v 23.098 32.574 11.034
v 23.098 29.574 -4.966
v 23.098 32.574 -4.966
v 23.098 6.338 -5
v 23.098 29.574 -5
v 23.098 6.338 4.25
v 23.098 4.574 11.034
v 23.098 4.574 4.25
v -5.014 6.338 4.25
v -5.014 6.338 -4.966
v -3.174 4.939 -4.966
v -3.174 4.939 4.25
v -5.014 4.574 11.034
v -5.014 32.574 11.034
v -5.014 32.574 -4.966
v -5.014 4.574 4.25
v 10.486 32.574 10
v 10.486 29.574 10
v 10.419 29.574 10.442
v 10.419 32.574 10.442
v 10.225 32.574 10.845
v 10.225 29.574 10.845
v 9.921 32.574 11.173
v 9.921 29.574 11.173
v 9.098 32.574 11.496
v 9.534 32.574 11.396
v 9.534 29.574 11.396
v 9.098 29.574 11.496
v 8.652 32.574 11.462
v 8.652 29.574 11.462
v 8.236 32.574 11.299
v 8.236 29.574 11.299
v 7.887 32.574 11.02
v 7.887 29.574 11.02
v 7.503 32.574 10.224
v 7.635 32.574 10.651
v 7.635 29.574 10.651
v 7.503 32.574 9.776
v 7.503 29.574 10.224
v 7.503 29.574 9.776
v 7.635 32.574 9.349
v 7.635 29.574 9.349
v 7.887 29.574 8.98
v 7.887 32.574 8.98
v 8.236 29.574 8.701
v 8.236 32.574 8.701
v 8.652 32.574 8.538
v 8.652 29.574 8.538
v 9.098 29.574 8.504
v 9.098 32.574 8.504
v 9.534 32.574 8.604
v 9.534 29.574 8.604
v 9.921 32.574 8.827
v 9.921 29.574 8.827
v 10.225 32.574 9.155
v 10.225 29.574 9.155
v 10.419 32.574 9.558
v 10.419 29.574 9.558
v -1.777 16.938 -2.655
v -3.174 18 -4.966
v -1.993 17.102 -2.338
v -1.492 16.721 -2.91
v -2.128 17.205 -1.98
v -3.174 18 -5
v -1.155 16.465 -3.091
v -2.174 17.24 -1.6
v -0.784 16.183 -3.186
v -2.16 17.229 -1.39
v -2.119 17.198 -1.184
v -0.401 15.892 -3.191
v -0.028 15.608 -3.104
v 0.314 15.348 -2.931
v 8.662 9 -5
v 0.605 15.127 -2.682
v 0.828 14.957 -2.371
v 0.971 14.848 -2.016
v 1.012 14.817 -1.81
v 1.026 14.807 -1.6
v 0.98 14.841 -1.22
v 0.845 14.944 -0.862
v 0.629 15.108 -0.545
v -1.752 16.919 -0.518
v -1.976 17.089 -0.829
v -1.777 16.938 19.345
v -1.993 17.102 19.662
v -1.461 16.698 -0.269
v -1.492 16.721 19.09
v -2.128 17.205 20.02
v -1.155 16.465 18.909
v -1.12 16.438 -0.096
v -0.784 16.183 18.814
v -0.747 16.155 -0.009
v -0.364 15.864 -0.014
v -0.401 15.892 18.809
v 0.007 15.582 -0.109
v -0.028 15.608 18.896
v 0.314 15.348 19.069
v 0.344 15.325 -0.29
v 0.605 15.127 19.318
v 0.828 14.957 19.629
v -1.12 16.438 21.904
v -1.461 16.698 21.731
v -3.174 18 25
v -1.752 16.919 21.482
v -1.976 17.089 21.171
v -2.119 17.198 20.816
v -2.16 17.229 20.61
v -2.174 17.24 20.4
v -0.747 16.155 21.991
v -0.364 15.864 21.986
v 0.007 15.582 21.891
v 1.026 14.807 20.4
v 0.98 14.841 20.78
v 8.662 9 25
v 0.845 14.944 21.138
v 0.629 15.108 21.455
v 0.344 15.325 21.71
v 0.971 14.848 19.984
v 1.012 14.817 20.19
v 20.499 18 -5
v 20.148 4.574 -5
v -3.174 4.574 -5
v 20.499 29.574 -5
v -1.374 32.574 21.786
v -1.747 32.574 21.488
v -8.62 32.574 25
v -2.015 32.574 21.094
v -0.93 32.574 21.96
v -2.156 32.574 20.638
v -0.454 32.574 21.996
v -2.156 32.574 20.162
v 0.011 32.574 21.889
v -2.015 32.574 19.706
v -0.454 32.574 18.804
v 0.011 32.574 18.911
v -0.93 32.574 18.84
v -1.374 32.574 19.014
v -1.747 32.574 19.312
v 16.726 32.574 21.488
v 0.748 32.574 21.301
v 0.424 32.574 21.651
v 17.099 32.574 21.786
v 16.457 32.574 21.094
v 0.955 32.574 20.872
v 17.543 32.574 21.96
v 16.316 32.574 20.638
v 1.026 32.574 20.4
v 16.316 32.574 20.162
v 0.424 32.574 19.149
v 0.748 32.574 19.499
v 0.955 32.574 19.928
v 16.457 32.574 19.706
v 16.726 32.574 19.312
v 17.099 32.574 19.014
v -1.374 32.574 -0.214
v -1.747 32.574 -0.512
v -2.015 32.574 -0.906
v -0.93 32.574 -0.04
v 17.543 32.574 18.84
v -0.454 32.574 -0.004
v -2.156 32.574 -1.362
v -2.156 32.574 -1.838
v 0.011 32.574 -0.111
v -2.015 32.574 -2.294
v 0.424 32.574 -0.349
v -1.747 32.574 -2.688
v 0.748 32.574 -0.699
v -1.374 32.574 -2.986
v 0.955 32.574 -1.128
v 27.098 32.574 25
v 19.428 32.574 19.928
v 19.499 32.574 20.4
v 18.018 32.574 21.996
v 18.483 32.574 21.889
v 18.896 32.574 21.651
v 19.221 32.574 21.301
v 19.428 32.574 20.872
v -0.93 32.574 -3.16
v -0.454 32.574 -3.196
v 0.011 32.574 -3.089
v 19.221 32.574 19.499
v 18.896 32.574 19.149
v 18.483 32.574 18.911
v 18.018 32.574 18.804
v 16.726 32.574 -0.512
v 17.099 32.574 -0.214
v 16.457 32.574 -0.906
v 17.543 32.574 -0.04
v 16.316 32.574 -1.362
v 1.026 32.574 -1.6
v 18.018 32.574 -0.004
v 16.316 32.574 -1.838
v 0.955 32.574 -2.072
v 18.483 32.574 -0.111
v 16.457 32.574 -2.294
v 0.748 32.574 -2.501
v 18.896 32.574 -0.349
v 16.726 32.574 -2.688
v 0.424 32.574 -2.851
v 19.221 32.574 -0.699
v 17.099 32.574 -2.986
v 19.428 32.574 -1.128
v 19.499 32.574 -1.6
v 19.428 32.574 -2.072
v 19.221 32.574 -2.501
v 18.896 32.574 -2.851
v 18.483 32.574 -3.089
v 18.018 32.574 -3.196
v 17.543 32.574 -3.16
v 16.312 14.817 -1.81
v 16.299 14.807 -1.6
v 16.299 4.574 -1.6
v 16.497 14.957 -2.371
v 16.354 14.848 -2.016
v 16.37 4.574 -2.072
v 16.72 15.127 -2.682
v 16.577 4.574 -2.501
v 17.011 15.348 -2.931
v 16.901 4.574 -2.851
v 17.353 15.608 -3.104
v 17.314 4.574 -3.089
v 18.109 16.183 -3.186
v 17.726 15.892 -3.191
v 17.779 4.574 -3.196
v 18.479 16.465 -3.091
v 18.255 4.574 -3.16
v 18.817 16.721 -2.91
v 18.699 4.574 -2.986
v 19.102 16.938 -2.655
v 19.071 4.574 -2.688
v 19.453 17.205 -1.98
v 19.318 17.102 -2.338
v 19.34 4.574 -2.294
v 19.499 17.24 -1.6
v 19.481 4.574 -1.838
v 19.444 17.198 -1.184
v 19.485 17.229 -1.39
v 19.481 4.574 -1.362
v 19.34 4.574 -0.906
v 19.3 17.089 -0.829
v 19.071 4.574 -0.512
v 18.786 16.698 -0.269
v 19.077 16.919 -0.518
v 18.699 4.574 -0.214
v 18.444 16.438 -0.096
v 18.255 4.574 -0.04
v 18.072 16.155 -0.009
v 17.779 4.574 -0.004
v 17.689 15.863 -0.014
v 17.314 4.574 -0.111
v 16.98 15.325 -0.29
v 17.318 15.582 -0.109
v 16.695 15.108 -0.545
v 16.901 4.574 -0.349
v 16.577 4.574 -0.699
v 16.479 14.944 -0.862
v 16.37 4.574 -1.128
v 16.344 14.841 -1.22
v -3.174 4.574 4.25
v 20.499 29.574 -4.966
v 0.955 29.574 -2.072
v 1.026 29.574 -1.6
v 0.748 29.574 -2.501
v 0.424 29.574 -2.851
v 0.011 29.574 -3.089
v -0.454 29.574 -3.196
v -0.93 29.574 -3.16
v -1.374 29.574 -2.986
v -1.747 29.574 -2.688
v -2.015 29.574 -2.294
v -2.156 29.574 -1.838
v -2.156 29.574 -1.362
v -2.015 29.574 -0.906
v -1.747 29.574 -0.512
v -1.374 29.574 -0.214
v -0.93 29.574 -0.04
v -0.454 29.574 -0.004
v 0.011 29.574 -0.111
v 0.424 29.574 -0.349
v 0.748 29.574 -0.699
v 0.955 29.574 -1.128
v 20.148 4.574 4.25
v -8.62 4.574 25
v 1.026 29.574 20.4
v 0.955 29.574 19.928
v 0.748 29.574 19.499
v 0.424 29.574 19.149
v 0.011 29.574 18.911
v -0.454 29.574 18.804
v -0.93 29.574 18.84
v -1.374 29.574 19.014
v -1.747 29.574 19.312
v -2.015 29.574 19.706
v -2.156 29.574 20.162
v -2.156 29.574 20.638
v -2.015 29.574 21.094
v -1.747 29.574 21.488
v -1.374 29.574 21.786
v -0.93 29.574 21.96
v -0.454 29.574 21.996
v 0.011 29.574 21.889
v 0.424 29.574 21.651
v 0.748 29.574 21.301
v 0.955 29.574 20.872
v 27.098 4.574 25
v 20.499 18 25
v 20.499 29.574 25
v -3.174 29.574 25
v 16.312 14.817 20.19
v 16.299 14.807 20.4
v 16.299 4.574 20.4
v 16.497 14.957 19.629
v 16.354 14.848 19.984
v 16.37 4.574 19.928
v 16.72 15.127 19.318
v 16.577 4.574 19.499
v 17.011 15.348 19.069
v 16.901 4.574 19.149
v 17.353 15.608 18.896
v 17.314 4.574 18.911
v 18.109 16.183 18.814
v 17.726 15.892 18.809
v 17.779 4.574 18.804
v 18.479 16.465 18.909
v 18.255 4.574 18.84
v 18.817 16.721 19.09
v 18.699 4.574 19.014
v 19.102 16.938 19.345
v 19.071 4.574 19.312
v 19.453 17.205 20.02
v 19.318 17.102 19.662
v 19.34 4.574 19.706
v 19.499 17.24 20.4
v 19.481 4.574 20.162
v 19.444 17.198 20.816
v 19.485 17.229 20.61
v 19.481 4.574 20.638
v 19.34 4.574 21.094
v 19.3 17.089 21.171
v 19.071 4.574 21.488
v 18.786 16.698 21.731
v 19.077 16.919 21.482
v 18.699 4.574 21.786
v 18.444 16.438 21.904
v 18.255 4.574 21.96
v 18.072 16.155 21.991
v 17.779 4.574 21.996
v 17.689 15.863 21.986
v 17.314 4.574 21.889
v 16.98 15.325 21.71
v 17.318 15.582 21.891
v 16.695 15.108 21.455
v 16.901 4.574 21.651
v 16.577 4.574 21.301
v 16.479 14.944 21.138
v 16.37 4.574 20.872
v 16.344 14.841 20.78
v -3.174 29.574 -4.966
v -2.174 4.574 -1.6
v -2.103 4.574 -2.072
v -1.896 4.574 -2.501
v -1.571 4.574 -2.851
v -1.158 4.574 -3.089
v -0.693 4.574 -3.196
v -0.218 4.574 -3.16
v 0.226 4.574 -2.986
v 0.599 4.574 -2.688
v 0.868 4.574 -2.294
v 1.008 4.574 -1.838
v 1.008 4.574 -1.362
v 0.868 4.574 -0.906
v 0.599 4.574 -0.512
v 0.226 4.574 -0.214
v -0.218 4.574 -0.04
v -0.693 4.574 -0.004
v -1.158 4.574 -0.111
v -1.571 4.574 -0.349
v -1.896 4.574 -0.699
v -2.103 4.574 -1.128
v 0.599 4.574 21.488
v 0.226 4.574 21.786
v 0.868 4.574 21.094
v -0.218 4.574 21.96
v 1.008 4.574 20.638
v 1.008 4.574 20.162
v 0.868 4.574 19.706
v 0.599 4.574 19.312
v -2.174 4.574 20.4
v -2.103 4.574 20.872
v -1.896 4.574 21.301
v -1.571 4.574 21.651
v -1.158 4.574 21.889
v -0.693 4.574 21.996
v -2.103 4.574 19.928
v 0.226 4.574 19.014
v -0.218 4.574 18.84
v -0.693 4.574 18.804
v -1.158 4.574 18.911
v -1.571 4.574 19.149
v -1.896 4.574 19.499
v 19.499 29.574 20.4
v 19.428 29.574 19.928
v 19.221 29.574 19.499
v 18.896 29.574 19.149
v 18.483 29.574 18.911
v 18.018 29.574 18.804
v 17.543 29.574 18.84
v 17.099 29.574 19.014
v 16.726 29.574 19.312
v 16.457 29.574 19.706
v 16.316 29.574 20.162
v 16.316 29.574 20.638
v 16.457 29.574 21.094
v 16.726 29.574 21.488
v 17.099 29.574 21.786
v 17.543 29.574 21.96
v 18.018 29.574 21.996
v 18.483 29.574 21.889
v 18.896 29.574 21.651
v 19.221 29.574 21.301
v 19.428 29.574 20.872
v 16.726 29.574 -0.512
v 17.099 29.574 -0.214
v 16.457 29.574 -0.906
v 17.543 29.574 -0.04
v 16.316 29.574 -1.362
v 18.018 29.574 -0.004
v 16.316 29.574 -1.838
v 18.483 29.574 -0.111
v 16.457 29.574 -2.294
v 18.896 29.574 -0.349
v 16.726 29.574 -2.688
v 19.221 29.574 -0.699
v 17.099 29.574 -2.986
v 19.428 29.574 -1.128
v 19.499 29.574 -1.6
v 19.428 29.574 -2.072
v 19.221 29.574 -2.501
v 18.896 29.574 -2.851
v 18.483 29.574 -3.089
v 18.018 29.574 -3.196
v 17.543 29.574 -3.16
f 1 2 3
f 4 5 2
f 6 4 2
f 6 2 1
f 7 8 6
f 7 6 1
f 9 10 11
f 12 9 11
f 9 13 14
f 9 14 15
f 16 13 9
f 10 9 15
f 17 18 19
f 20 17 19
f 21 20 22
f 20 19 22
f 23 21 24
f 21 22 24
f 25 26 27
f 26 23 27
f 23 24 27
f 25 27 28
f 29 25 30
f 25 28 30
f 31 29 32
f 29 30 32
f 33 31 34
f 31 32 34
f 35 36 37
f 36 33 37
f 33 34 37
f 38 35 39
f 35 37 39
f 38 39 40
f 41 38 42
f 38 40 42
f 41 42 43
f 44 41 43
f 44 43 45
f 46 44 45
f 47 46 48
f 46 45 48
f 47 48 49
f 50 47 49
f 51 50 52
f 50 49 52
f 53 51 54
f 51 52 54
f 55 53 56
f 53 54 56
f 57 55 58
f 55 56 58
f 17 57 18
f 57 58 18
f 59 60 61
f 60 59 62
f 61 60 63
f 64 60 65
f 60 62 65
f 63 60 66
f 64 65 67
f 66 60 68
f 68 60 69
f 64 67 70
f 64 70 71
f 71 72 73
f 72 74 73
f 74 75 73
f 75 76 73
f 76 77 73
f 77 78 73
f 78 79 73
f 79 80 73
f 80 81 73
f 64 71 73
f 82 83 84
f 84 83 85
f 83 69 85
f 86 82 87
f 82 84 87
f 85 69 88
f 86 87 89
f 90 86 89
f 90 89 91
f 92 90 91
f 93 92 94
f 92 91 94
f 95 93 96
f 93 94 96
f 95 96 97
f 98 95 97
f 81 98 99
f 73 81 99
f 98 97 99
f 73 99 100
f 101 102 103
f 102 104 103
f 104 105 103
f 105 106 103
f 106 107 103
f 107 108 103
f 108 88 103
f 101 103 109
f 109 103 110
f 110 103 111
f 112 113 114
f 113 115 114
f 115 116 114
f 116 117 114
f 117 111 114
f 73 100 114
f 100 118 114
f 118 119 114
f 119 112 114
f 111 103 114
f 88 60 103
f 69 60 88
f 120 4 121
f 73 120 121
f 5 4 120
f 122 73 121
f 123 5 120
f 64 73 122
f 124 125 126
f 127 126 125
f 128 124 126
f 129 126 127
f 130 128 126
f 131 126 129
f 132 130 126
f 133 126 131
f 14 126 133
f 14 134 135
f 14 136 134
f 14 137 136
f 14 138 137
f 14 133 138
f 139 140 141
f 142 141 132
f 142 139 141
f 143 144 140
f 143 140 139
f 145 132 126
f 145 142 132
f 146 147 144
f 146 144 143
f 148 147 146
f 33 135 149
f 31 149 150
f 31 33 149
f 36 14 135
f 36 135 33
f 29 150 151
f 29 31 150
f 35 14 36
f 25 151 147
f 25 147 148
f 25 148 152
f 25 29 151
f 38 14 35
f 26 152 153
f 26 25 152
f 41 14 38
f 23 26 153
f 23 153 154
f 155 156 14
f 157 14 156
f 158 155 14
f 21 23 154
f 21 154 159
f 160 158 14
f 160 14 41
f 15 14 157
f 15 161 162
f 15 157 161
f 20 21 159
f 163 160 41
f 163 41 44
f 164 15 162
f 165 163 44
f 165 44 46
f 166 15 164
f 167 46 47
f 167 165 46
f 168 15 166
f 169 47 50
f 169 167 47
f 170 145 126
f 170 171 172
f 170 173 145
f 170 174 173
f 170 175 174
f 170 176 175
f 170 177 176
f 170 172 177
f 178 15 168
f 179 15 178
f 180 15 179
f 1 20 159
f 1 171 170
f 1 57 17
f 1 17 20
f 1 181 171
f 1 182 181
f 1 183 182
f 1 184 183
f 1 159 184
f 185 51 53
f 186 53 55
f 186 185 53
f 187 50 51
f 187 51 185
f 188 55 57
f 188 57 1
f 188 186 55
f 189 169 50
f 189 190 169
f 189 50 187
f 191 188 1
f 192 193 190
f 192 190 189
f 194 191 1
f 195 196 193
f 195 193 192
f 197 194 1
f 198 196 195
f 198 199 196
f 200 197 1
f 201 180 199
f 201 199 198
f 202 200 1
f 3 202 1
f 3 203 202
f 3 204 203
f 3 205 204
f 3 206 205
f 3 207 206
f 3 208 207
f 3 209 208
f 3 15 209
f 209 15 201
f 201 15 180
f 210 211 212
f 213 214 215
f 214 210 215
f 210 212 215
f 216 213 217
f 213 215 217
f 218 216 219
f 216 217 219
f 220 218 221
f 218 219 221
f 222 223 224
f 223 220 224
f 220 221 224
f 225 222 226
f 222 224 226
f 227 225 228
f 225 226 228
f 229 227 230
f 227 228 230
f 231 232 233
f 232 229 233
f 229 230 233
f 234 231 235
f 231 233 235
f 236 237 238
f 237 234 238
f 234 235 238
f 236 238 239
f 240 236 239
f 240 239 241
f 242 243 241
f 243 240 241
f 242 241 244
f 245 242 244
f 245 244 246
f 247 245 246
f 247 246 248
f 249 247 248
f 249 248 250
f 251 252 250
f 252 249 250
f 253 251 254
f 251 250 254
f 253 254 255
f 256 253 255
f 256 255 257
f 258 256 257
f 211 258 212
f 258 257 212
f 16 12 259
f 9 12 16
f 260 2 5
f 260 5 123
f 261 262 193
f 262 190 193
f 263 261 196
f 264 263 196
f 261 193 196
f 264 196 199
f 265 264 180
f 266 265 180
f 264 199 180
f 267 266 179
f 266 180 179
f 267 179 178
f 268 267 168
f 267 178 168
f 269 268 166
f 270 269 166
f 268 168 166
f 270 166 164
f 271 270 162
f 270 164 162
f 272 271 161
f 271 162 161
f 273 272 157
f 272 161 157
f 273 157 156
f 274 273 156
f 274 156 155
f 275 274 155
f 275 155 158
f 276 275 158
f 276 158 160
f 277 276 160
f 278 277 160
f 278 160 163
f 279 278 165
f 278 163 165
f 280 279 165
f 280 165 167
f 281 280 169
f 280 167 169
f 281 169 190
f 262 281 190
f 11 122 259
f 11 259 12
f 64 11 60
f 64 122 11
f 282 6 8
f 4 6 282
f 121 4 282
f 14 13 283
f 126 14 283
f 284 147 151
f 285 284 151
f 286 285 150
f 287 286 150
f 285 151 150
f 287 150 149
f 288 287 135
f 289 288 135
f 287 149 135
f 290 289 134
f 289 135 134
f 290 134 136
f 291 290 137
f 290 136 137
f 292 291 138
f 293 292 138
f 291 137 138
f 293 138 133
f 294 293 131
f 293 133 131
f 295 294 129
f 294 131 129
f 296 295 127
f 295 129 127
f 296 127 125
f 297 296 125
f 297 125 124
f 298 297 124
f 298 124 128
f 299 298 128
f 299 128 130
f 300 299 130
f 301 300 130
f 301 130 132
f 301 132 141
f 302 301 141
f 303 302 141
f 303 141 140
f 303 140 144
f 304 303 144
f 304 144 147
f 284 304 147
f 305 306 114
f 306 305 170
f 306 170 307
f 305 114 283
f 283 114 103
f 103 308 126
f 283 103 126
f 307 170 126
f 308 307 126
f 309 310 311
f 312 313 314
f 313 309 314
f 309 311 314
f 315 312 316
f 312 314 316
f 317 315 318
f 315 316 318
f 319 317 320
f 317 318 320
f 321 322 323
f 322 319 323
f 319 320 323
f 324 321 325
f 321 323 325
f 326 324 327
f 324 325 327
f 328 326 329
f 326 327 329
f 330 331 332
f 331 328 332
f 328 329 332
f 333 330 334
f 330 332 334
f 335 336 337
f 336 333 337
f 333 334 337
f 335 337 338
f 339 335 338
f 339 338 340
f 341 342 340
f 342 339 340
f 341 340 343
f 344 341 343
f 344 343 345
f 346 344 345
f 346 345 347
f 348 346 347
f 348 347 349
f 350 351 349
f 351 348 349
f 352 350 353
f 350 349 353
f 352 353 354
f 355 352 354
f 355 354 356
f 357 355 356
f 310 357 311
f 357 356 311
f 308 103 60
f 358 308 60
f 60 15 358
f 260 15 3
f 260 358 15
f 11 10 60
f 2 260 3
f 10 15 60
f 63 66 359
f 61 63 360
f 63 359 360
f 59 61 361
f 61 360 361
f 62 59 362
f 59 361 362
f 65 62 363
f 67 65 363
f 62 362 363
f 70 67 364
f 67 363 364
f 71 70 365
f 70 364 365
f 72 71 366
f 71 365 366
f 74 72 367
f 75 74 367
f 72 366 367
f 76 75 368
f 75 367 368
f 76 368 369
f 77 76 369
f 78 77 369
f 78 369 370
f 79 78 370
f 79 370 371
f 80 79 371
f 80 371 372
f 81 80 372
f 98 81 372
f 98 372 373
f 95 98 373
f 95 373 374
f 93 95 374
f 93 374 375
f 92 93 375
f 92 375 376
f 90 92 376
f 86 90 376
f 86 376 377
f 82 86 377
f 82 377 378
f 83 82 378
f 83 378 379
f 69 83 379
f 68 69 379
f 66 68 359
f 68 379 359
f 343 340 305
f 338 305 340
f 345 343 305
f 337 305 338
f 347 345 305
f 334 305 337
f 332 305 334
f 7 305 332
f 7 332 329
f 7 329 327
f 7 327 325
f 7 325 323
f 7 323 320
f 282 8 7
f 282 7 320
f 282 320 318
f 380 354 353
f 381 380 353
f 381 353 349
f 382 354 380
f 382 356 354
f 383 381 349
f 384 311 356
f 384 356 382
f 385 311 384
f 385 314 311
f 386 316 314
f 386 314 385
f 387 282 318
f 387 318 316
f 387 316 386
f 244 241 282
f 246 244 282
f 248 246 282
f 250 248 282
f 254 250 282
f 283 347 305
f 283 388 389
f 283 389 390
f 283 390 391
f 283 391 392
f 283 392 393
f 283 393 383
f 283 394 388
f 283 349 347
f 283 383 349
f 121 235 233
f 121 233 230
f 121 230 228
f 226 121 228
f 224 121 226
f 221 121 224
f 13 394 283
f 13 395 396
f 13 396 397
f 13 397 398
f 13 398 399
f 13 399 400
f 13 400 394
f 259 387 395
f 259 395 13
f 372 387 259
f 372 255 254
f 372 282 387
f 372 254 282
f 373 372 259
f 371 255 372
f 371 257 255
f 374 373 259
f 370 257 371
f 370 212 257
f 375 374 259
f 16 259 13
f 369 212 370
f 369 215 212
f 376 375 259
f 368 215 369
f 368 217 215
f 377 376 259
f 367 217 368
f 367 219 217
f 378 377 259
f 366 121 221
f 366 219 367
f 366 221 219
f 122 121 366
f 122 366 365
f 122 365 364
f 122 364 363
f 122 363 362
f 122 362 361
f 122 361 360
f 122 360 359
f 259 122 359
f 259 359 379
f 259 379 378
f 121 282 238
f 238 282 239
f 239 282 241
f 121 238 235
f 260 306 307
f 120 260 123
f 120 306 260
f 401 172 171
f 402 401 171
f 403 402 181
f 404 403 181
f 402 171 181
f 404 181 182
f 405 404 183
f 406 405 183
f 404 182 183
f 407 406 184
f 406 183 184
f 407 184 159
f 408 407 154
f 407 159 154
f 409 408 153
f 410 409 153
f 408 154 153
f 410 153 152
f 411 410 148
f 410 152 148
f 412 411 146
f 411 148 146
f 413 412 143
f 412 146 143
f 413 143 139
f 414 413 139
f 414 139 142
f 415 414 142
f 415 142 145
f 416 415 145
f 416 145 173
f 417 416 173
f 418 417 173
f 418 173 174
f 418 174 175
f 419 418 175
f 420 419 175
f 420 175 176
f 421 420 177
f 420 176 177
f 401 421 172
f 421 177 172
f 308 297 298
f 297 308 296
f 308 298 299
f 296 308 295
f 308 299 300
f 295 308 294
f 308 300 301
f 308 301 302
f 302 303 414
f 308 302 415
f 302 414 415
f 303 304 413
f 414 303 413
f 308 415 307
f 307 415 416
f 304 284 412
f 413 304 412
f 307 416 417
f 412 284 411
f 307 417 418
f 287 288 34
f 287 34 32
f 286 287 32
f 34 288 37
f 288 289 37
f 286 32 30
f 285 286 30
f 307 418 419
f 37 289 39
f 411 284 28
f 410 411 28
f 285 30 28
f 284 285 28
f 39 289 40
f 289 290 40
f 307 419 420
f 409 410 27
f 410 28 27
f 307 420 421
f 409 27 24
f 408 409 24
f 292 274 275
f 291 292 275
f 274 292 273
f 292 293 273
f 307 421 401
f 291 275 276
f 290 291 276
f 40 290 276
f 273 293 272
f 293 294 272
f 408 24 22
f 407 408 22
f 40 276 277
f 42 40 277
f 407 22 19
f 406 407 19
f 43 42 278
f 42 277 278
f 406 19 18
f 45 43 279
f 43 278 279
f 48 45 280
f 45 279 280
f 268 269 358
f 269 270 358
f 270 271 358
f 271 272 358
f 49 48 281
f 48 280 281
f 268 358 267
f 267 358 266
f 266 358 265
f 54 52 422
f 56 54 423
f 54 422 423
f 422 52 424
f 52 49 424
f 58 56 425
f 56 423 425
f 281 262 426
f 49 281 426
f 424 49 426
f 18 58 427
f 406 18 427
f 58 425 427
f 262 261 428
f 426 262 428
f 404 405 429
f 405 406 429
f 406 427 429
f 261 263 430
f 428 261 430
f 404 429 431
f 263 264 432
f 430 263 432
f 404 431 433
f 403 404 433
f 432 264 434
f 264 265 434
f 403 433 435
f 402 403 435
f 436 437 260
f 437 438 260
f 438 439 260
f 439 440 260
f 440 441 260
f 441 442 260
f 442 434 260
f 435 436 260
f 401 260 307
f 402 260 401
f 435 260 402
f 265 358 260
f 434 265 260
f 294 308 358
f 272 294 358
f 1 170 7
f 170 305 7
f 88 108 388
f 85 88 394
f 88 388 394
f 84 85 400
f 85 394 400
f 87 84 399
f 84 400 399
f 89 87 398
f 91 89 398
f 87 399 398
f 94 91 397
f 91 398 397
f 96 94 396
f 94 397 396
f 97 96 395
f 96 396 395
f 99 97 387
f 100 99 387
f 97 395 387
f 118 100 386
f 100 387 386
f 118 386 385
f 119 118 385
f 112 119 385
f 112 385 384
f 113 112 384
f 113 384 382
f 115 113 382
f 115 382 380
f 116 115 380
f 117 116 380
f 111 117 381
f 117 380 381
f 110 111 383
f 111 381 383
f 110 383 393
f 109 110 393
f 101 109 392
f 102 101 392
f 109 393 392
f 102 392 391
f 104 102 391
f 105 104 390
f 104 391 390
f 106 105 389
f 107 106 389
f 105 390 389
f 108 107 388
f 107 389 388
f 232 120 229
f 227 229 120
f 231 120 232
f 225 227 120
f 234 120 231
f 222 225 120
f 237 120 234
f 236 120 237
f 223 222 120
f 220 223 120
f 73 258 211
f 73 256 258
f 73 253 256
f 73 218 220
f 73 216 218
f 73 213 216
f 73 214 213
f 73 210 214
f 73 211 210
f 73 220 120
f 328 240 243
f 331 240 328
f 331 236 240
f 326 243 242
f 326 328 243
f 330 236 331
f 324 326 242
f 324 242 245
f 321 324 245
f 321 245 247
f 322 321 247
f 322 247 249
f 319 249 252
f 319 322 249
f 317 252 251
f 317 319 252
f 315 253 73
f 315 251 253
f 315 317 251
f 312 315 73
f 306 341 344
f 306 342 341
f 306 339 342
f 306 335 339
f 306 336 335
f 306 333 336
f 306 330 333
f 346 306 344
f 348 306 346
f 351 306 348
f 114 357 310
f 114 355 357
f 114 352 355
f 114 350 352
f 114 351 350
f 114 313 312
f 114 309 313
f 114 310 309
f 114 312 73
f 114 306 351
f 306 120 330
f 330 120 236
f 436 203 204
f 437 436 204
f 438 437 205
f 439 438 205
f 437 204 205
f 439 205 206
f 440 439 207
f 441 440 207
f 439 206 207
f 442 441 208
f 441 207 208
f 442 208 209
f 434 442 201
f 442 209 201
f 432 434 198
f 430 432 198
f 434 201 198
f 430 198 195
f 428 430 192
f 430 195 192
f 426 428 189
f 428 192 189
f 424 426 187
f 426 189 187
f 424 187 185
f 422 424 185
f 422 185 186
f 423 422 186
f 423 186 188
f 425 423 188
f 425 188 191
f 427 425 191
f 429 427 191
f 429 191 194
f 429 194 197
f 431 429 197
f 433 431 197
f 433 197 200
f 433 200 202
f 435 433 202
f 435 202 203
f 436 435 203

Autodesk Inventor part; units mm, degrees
ref_plane "РабПлоскость2" through (0, 0, -5) normal (0, 0, -1) x (-1, 0, 0)
sketch "Эскиз1" plane through (0, 0, -5) normal (0, 0, -1) x (-1, 0, 0)
  line L0 (-19.4986, 4.5741) -> (-16.2986, 4.5741) projected
  line L1 (-1.0261, 4.5741) -> (2.1739, 4.5741) projected
  line L2 (-25.5748, 4.5741) -> (-23.7748, 4.5741) projected
  line L3 (5.4196, 4.5741) -> (7.2196, 4.5741) projected
  line L4 (-20.4986, 4.5741) -> (3.1739, 4.5741)
  line L5 (3.1739, 4.5741) -> (3.1739, 9.0001)
  line L6 (3.1739, 9.0001) -> (-20.4986, 9.0001)
  line L7 (-20.4986, 9.0001) -> (-20.4986, 4.5741)
  line L8 (-38.6624, 4.5741) -> (21.3376, 4.5741) projected
  point P0 (0, 0)
  point P1 (-20.4986, 6.7871)
  point P2 (3.1739, 6.7871)
  dimension "d0" = 1
  dimension "d1" = 1
  dimension "d3" = 4.426
extrude "Выдавливание1" add sketch "Эскиз1" against normal blind 30
ref_plane "РабПлоскость3" through (5.0978, 4.5741, 0.0339) normal (0, 1, 0) x (-1, 0, 0)
sketch "Эскиз3" plane through (0, 0, 25) normal (0, 0, 1) x (1, 0, 0)
  line L0 (20.4986, 4.5741) -> (20.4986, 9.0001) projected
  line L1 (20.4986, 9.0001) -> (20.4986, 18.0001)
  line L2 (20.4986, 18.0001) -> (8.6624, 9.0001)
  line L3 (20.4986, 9.0001) -> (-3.1739, 9.0001) projected
  line L4 (-3.1739, 9.0001) -> (-3.1739, 4.5741) projected
  line L5 (-3.1739, 18.0001) -> (-3.1739, 9.0001)
  line L6 (-3.1739, 18.0001) -> (8.6624, 9.0001)
  point P0 (0, 0)
  dimension "d8" = 9
  dimension "d9" = 9
extrude "Выдавливание3" add sketch "Эскиз3" against normal up to surface (30 mm away)
ref_plane "РабПлоскость4" through (5.0978, 14.8061, 0.0339) normal (0, 1, 0) x (-1, 0, 0)
sketch "Эскиз2" plane through (5.0978, 4.5741, 0.0339) normal (0, 1, 0) x (-1, 0, 0)
  circle A0 centre (-31.4768, 2.1354) radius 0.9
  circle A1 centre (23.5157, 1.4536) radius 0.9
  circle A2 centre (-19.4778, 1.9866) radius 0.9
  circle A3 centre (-19.5769, -6.0128) radius 0.9
  circle A4 centre (23.4165, -6.5458) radius 0.9
  circle A5 centre (11.5166, 1.6023) radius 0.9
  circle A6 centre (11.4174, -6.3971) radius 0.9
  circle A7 centre (-31.576, -5.864) radius 0.9
  circle A8 centre (-12.8008, -1.6339) radius 1.6
  circle A9 centre (5.6717, -1.6339) radius 1.6
  circle A10 centre (-12.8008, 20.3661) radius 1.6
  circle A11 centre (5.6717, 20.3661) radius 1.6
  arc A12 (11.4355, 36.4061) -> (11.4355, 44.3661) centre (11.4355, 40.3861) ccw
  line L0 (11.4355, 44.3661) -> (-18.5645, 44.3661)
  arc A13 (-18.5645, 44.3661) -> (-18.5645, 36.4061) centre (-18.5645, 40.3861) ccw
  line L1 (-18.5645, 36.4061) -> (11.4355, 36.4061)
  line L2 (-33.5645, -20.6339) -> (-33.5645, 49.3661)
  line L3 (-33.5645, 49.3661) -> (26.4355, 49.3661)
  line L4 (26.4355, 49.3661) -> (26.4355, -20.6339)
  line L5 (26.4355, -20.6339) -> (-33.5645, -20.6339)
  point P0 (5.0978, -0.0339)
extrude "дырки" cut sketch "Эскиз2" along normal through all contours A8 | A9 | A10 | A11
sketch "Эскиз4" plane through (5.0978, 14.8061, 0.0339) normal (0, 1, 0) x (-1, 0, 0)
  circle A0 centre (-12.8008, -1.6339) radius 1.6 projected
  circle A1 centre (-12.8008, 20.3661) radius 1.6 projected
  line L0 (-15.4008, -5.0339) -> (-3.5645, -5.0339) projected
  line L1 (-3.5645, 24.9661) -> (-3.5645, -5.0339) projected
  line L2 (-15.4008, 24.9661) -> (-3.5645, 24.9661) projected
  line L3 (-15.4008, 24.9661) -> (-15.4008, -5.0339) projected
  circle A2 centre (5.6717, -1.6339) radius 1.6 projected
  circle A3 centre (5.6717, 20.3661) radius 1.6 projected
  line L4 (-3.5645, -5.0339) -> (8.2717, -5.0339) projected
  line L5 (8.2717, 24.9661) -> (8.2717, -5.0339) projected
  line L6 (-3.5645, 24.9661) -> (8.2717, 24.9661) projected
  line L7 (-3.5645, 24.9661) -> (-3.5645, -5.0339) projected
  circle A4 centre (-12.8008, 20.3661) radius 2.1992
  circle A5 centre (5.6717, 20.3661) radius 2.3283
  circle A6 centre (-12.8008, -1.6339) radius 2.1992
  circle A7 centre (5.6717, -1.6339) radius 2.3283
  point P0 (5.0978, -0.0339)
ref_plane "РабПлоскость5" through (5.0978, 4.5741, 0.0339) normal (0, 1, 0) x (-1, 0, 0)
sketch "Эскиз5" plane through (5.0978, 4.5741, 0.0339) normal (0, 1, 0) x (-1, 0, 0)
  line L0 (-15.4008, -5.0339) -> (-3.5645, -5.0339) projected
  line L1 (-3.5645, 24.9661) -> (-3.5645, -5.0339) projected
  line L2 (-15.4008, 24.9661) -> (-3.5645, 24.9661) projected
  line L3 (-15.4008, 24.9661) -> (-15.4008, -5.0339) projected
  line L4 (-3.5645, -5.0339) -> (8.2717, -5.0339) projected
  line L5 (8.2717, 24.9661) -> (8.2717, -5.0339) projected
  line L6 (-3.5645, 24.9661) -> (8.2717, 24.9661) projected
  line L7 (-3.5645, 24.9661) -> (-3.5645, -5.0339) projected
  line L8 (-15.4008, -5.0339) -> (-18, -5.0339)
  line L9 (-18, -5.0339) -> (-18, 24.9661)
  line L10 (-18, 24.9661) -> (-15.4008, 24.9661)
  line L11 (-15.4008, 24.9661) -> (-15.4008, -5.0339)
  line L12 (8.2717, 24.9661) -> (10.1117, 24.9661)
  line L13 (10.1117, 24.9661) -> (10.1117, -5)
  line L14 (10.1117, -5) -> (8.2717, -5)
  line L15 (8.2717, -5) -> (8.2717, 24.9661)
  line L16 (10.1117, 11) -> (13.7176, 11)
  line L17 (13.7176, 11) -> (13.7176, 24.9661)
  line L18 (13.7176, 24.9661) -> (10.1117, 24.9661)
  line L19 (10.1117, 24.9661) -> (10.1117, 11)
  line L20 (-18, 11) -> (-22, 11)
  line L21 (-22, 11) -> (-22, 24.9661)
  line L22 (-22, 24.9661) -> (-18, 24.9661)
  line L23 (-18, 24.9661) -> (-18, 11)
  line L24 (-22, 24.9661) -> (-18, 11)
  line L25 (10.1117, 11) -> (13.7176, 24.9661)
  point P0 (5.0978, -0.0339)
  point P1 (-15.4008, 24.9661)
  point P2 (8.2717, -5)
  dimension "d22" = 1.84
extrude "Выдавливание5" add sketch "Эскиз5" along normal blind 25 contours L8 L9 L10 L3 | L9 L24 L22 | L12 L13 L14 L5 | L18 L25 L13
sketch "Эскиз6" plane through (5.0978, 29.5741, 0.0339) normal (0, 1, 0) x (1, 0, 0)
  line L0 (15.4008, 5.0339) -> (15.4008, -24.9661) projected
  line L1 (15.4008, -24.9661) -> (22, -24.9661) projected
  line L2 (22, -24.9661) -> (18, -11) projected
  line L3 (18, -11) -> (18, 5.0339) projected
  line L4 (18, 5.0339) -> (15.4008, 5.0339) projected
  line L5 (-13.7176, -24.9661) -> (-8.2717, -24.9661) projected
  line L6 (-8.2717, -24.9661) -> (-8.2717, 5) projected
  line L7 (-8.2717, 5) -> (-10.1117, 5) projected
  line L8 (-10.1117, 5) -> (-10.1117, -11) projected
  line L9 (-10.1117, -11) -> (-13.7176, -24.9661) projected
  line L10 (15.4008, -24.9661) -> (22, -24.9661) projected
  line L11 (15.4008, -24.9661) -> (-8.2717, -24.9661)
  line L12 (18, -11) -> (18, 5.0339) projected
  line L13 (18, 5) -> (-10.1117, 5)
  circle A0 centre (3.8883, -9.9661) radius 1.5
  point P0 (-5.0978, 0.0339)
  dimension "d17" = 15
  dimension "d18" = 14
  dimension "d19" = 3
extrude "Выдавливание6" add sketch "Эскиз6" along normal blind 3 contours L13 L3 L2 L1 L0 | L0 L11 L6 L13 | L6 L5 L9 L8 L7
sketch "Эскиз7" plane through (5.0978, 32.5741, 0.0339) normal (0, 1, 0) x (1, 0, 0)
  circle A0 centre (12.8008, -20.3661) radius 1.6 projected
  circle A1 centre (-5.6717, -20.3661) radius 1.6 projected
  circle A2 centre (-5.6717, 1.6339) radius 1.6 projected
  circle A3 centre (12.8008, 1.6339) radius 1.6 projected
  point P0 (-5.0978, 0.0339)
extrude "Выдавливание7" cut sketch "Эскиз7" against normal through all
sketch "Эскиз9" plane through (0, 0, -5) normal (0, 0, -1) x (-1, 0, 0)
  line L0 (-23.0978, 4.5741) -> (-23.0978, 29.5741) projected
  line L1 (-23.0978, 29.5741) -> (-20.4986, 29.5741) projected
  line L2 (-20.4986, 29.5741) -> (-20.4986, 18.0001) projected
  line L3 (-20.4986, 18.0001) -> (-8.6624, 9.0001) projected
  line L4 (-8.6624, 9.0001) -> (3.1739, 18.0001) projected
  line L5 (3.1739, 18.0001) -> (3.1739, 4.5741) projected
  line L6 (3.1739, 4.5741) -> (-23.0978, 4.5741) projected
  line L7 (-23.0978, 6.3376) -> (-20.1479, 4.5741)
  line L8 (5.0139, 4.5741) -> (5.0139, 32.5741) projected
  line L9 (5.0139, 6.3376) -> (2.6946, 4.5741)
  line L10 (3.1739, 4.5741) -> (5.0139, 4.5741)
  point P0 (0, 0)
  point P1 (3.1739, 4.9385)
extrude "Выдавливание9" cut sketch "Эскиз9" against normal blind 9.25 contours L0 L7 L6 | L5 L9 L8 L10
properties part number "крепеж_маркера"
